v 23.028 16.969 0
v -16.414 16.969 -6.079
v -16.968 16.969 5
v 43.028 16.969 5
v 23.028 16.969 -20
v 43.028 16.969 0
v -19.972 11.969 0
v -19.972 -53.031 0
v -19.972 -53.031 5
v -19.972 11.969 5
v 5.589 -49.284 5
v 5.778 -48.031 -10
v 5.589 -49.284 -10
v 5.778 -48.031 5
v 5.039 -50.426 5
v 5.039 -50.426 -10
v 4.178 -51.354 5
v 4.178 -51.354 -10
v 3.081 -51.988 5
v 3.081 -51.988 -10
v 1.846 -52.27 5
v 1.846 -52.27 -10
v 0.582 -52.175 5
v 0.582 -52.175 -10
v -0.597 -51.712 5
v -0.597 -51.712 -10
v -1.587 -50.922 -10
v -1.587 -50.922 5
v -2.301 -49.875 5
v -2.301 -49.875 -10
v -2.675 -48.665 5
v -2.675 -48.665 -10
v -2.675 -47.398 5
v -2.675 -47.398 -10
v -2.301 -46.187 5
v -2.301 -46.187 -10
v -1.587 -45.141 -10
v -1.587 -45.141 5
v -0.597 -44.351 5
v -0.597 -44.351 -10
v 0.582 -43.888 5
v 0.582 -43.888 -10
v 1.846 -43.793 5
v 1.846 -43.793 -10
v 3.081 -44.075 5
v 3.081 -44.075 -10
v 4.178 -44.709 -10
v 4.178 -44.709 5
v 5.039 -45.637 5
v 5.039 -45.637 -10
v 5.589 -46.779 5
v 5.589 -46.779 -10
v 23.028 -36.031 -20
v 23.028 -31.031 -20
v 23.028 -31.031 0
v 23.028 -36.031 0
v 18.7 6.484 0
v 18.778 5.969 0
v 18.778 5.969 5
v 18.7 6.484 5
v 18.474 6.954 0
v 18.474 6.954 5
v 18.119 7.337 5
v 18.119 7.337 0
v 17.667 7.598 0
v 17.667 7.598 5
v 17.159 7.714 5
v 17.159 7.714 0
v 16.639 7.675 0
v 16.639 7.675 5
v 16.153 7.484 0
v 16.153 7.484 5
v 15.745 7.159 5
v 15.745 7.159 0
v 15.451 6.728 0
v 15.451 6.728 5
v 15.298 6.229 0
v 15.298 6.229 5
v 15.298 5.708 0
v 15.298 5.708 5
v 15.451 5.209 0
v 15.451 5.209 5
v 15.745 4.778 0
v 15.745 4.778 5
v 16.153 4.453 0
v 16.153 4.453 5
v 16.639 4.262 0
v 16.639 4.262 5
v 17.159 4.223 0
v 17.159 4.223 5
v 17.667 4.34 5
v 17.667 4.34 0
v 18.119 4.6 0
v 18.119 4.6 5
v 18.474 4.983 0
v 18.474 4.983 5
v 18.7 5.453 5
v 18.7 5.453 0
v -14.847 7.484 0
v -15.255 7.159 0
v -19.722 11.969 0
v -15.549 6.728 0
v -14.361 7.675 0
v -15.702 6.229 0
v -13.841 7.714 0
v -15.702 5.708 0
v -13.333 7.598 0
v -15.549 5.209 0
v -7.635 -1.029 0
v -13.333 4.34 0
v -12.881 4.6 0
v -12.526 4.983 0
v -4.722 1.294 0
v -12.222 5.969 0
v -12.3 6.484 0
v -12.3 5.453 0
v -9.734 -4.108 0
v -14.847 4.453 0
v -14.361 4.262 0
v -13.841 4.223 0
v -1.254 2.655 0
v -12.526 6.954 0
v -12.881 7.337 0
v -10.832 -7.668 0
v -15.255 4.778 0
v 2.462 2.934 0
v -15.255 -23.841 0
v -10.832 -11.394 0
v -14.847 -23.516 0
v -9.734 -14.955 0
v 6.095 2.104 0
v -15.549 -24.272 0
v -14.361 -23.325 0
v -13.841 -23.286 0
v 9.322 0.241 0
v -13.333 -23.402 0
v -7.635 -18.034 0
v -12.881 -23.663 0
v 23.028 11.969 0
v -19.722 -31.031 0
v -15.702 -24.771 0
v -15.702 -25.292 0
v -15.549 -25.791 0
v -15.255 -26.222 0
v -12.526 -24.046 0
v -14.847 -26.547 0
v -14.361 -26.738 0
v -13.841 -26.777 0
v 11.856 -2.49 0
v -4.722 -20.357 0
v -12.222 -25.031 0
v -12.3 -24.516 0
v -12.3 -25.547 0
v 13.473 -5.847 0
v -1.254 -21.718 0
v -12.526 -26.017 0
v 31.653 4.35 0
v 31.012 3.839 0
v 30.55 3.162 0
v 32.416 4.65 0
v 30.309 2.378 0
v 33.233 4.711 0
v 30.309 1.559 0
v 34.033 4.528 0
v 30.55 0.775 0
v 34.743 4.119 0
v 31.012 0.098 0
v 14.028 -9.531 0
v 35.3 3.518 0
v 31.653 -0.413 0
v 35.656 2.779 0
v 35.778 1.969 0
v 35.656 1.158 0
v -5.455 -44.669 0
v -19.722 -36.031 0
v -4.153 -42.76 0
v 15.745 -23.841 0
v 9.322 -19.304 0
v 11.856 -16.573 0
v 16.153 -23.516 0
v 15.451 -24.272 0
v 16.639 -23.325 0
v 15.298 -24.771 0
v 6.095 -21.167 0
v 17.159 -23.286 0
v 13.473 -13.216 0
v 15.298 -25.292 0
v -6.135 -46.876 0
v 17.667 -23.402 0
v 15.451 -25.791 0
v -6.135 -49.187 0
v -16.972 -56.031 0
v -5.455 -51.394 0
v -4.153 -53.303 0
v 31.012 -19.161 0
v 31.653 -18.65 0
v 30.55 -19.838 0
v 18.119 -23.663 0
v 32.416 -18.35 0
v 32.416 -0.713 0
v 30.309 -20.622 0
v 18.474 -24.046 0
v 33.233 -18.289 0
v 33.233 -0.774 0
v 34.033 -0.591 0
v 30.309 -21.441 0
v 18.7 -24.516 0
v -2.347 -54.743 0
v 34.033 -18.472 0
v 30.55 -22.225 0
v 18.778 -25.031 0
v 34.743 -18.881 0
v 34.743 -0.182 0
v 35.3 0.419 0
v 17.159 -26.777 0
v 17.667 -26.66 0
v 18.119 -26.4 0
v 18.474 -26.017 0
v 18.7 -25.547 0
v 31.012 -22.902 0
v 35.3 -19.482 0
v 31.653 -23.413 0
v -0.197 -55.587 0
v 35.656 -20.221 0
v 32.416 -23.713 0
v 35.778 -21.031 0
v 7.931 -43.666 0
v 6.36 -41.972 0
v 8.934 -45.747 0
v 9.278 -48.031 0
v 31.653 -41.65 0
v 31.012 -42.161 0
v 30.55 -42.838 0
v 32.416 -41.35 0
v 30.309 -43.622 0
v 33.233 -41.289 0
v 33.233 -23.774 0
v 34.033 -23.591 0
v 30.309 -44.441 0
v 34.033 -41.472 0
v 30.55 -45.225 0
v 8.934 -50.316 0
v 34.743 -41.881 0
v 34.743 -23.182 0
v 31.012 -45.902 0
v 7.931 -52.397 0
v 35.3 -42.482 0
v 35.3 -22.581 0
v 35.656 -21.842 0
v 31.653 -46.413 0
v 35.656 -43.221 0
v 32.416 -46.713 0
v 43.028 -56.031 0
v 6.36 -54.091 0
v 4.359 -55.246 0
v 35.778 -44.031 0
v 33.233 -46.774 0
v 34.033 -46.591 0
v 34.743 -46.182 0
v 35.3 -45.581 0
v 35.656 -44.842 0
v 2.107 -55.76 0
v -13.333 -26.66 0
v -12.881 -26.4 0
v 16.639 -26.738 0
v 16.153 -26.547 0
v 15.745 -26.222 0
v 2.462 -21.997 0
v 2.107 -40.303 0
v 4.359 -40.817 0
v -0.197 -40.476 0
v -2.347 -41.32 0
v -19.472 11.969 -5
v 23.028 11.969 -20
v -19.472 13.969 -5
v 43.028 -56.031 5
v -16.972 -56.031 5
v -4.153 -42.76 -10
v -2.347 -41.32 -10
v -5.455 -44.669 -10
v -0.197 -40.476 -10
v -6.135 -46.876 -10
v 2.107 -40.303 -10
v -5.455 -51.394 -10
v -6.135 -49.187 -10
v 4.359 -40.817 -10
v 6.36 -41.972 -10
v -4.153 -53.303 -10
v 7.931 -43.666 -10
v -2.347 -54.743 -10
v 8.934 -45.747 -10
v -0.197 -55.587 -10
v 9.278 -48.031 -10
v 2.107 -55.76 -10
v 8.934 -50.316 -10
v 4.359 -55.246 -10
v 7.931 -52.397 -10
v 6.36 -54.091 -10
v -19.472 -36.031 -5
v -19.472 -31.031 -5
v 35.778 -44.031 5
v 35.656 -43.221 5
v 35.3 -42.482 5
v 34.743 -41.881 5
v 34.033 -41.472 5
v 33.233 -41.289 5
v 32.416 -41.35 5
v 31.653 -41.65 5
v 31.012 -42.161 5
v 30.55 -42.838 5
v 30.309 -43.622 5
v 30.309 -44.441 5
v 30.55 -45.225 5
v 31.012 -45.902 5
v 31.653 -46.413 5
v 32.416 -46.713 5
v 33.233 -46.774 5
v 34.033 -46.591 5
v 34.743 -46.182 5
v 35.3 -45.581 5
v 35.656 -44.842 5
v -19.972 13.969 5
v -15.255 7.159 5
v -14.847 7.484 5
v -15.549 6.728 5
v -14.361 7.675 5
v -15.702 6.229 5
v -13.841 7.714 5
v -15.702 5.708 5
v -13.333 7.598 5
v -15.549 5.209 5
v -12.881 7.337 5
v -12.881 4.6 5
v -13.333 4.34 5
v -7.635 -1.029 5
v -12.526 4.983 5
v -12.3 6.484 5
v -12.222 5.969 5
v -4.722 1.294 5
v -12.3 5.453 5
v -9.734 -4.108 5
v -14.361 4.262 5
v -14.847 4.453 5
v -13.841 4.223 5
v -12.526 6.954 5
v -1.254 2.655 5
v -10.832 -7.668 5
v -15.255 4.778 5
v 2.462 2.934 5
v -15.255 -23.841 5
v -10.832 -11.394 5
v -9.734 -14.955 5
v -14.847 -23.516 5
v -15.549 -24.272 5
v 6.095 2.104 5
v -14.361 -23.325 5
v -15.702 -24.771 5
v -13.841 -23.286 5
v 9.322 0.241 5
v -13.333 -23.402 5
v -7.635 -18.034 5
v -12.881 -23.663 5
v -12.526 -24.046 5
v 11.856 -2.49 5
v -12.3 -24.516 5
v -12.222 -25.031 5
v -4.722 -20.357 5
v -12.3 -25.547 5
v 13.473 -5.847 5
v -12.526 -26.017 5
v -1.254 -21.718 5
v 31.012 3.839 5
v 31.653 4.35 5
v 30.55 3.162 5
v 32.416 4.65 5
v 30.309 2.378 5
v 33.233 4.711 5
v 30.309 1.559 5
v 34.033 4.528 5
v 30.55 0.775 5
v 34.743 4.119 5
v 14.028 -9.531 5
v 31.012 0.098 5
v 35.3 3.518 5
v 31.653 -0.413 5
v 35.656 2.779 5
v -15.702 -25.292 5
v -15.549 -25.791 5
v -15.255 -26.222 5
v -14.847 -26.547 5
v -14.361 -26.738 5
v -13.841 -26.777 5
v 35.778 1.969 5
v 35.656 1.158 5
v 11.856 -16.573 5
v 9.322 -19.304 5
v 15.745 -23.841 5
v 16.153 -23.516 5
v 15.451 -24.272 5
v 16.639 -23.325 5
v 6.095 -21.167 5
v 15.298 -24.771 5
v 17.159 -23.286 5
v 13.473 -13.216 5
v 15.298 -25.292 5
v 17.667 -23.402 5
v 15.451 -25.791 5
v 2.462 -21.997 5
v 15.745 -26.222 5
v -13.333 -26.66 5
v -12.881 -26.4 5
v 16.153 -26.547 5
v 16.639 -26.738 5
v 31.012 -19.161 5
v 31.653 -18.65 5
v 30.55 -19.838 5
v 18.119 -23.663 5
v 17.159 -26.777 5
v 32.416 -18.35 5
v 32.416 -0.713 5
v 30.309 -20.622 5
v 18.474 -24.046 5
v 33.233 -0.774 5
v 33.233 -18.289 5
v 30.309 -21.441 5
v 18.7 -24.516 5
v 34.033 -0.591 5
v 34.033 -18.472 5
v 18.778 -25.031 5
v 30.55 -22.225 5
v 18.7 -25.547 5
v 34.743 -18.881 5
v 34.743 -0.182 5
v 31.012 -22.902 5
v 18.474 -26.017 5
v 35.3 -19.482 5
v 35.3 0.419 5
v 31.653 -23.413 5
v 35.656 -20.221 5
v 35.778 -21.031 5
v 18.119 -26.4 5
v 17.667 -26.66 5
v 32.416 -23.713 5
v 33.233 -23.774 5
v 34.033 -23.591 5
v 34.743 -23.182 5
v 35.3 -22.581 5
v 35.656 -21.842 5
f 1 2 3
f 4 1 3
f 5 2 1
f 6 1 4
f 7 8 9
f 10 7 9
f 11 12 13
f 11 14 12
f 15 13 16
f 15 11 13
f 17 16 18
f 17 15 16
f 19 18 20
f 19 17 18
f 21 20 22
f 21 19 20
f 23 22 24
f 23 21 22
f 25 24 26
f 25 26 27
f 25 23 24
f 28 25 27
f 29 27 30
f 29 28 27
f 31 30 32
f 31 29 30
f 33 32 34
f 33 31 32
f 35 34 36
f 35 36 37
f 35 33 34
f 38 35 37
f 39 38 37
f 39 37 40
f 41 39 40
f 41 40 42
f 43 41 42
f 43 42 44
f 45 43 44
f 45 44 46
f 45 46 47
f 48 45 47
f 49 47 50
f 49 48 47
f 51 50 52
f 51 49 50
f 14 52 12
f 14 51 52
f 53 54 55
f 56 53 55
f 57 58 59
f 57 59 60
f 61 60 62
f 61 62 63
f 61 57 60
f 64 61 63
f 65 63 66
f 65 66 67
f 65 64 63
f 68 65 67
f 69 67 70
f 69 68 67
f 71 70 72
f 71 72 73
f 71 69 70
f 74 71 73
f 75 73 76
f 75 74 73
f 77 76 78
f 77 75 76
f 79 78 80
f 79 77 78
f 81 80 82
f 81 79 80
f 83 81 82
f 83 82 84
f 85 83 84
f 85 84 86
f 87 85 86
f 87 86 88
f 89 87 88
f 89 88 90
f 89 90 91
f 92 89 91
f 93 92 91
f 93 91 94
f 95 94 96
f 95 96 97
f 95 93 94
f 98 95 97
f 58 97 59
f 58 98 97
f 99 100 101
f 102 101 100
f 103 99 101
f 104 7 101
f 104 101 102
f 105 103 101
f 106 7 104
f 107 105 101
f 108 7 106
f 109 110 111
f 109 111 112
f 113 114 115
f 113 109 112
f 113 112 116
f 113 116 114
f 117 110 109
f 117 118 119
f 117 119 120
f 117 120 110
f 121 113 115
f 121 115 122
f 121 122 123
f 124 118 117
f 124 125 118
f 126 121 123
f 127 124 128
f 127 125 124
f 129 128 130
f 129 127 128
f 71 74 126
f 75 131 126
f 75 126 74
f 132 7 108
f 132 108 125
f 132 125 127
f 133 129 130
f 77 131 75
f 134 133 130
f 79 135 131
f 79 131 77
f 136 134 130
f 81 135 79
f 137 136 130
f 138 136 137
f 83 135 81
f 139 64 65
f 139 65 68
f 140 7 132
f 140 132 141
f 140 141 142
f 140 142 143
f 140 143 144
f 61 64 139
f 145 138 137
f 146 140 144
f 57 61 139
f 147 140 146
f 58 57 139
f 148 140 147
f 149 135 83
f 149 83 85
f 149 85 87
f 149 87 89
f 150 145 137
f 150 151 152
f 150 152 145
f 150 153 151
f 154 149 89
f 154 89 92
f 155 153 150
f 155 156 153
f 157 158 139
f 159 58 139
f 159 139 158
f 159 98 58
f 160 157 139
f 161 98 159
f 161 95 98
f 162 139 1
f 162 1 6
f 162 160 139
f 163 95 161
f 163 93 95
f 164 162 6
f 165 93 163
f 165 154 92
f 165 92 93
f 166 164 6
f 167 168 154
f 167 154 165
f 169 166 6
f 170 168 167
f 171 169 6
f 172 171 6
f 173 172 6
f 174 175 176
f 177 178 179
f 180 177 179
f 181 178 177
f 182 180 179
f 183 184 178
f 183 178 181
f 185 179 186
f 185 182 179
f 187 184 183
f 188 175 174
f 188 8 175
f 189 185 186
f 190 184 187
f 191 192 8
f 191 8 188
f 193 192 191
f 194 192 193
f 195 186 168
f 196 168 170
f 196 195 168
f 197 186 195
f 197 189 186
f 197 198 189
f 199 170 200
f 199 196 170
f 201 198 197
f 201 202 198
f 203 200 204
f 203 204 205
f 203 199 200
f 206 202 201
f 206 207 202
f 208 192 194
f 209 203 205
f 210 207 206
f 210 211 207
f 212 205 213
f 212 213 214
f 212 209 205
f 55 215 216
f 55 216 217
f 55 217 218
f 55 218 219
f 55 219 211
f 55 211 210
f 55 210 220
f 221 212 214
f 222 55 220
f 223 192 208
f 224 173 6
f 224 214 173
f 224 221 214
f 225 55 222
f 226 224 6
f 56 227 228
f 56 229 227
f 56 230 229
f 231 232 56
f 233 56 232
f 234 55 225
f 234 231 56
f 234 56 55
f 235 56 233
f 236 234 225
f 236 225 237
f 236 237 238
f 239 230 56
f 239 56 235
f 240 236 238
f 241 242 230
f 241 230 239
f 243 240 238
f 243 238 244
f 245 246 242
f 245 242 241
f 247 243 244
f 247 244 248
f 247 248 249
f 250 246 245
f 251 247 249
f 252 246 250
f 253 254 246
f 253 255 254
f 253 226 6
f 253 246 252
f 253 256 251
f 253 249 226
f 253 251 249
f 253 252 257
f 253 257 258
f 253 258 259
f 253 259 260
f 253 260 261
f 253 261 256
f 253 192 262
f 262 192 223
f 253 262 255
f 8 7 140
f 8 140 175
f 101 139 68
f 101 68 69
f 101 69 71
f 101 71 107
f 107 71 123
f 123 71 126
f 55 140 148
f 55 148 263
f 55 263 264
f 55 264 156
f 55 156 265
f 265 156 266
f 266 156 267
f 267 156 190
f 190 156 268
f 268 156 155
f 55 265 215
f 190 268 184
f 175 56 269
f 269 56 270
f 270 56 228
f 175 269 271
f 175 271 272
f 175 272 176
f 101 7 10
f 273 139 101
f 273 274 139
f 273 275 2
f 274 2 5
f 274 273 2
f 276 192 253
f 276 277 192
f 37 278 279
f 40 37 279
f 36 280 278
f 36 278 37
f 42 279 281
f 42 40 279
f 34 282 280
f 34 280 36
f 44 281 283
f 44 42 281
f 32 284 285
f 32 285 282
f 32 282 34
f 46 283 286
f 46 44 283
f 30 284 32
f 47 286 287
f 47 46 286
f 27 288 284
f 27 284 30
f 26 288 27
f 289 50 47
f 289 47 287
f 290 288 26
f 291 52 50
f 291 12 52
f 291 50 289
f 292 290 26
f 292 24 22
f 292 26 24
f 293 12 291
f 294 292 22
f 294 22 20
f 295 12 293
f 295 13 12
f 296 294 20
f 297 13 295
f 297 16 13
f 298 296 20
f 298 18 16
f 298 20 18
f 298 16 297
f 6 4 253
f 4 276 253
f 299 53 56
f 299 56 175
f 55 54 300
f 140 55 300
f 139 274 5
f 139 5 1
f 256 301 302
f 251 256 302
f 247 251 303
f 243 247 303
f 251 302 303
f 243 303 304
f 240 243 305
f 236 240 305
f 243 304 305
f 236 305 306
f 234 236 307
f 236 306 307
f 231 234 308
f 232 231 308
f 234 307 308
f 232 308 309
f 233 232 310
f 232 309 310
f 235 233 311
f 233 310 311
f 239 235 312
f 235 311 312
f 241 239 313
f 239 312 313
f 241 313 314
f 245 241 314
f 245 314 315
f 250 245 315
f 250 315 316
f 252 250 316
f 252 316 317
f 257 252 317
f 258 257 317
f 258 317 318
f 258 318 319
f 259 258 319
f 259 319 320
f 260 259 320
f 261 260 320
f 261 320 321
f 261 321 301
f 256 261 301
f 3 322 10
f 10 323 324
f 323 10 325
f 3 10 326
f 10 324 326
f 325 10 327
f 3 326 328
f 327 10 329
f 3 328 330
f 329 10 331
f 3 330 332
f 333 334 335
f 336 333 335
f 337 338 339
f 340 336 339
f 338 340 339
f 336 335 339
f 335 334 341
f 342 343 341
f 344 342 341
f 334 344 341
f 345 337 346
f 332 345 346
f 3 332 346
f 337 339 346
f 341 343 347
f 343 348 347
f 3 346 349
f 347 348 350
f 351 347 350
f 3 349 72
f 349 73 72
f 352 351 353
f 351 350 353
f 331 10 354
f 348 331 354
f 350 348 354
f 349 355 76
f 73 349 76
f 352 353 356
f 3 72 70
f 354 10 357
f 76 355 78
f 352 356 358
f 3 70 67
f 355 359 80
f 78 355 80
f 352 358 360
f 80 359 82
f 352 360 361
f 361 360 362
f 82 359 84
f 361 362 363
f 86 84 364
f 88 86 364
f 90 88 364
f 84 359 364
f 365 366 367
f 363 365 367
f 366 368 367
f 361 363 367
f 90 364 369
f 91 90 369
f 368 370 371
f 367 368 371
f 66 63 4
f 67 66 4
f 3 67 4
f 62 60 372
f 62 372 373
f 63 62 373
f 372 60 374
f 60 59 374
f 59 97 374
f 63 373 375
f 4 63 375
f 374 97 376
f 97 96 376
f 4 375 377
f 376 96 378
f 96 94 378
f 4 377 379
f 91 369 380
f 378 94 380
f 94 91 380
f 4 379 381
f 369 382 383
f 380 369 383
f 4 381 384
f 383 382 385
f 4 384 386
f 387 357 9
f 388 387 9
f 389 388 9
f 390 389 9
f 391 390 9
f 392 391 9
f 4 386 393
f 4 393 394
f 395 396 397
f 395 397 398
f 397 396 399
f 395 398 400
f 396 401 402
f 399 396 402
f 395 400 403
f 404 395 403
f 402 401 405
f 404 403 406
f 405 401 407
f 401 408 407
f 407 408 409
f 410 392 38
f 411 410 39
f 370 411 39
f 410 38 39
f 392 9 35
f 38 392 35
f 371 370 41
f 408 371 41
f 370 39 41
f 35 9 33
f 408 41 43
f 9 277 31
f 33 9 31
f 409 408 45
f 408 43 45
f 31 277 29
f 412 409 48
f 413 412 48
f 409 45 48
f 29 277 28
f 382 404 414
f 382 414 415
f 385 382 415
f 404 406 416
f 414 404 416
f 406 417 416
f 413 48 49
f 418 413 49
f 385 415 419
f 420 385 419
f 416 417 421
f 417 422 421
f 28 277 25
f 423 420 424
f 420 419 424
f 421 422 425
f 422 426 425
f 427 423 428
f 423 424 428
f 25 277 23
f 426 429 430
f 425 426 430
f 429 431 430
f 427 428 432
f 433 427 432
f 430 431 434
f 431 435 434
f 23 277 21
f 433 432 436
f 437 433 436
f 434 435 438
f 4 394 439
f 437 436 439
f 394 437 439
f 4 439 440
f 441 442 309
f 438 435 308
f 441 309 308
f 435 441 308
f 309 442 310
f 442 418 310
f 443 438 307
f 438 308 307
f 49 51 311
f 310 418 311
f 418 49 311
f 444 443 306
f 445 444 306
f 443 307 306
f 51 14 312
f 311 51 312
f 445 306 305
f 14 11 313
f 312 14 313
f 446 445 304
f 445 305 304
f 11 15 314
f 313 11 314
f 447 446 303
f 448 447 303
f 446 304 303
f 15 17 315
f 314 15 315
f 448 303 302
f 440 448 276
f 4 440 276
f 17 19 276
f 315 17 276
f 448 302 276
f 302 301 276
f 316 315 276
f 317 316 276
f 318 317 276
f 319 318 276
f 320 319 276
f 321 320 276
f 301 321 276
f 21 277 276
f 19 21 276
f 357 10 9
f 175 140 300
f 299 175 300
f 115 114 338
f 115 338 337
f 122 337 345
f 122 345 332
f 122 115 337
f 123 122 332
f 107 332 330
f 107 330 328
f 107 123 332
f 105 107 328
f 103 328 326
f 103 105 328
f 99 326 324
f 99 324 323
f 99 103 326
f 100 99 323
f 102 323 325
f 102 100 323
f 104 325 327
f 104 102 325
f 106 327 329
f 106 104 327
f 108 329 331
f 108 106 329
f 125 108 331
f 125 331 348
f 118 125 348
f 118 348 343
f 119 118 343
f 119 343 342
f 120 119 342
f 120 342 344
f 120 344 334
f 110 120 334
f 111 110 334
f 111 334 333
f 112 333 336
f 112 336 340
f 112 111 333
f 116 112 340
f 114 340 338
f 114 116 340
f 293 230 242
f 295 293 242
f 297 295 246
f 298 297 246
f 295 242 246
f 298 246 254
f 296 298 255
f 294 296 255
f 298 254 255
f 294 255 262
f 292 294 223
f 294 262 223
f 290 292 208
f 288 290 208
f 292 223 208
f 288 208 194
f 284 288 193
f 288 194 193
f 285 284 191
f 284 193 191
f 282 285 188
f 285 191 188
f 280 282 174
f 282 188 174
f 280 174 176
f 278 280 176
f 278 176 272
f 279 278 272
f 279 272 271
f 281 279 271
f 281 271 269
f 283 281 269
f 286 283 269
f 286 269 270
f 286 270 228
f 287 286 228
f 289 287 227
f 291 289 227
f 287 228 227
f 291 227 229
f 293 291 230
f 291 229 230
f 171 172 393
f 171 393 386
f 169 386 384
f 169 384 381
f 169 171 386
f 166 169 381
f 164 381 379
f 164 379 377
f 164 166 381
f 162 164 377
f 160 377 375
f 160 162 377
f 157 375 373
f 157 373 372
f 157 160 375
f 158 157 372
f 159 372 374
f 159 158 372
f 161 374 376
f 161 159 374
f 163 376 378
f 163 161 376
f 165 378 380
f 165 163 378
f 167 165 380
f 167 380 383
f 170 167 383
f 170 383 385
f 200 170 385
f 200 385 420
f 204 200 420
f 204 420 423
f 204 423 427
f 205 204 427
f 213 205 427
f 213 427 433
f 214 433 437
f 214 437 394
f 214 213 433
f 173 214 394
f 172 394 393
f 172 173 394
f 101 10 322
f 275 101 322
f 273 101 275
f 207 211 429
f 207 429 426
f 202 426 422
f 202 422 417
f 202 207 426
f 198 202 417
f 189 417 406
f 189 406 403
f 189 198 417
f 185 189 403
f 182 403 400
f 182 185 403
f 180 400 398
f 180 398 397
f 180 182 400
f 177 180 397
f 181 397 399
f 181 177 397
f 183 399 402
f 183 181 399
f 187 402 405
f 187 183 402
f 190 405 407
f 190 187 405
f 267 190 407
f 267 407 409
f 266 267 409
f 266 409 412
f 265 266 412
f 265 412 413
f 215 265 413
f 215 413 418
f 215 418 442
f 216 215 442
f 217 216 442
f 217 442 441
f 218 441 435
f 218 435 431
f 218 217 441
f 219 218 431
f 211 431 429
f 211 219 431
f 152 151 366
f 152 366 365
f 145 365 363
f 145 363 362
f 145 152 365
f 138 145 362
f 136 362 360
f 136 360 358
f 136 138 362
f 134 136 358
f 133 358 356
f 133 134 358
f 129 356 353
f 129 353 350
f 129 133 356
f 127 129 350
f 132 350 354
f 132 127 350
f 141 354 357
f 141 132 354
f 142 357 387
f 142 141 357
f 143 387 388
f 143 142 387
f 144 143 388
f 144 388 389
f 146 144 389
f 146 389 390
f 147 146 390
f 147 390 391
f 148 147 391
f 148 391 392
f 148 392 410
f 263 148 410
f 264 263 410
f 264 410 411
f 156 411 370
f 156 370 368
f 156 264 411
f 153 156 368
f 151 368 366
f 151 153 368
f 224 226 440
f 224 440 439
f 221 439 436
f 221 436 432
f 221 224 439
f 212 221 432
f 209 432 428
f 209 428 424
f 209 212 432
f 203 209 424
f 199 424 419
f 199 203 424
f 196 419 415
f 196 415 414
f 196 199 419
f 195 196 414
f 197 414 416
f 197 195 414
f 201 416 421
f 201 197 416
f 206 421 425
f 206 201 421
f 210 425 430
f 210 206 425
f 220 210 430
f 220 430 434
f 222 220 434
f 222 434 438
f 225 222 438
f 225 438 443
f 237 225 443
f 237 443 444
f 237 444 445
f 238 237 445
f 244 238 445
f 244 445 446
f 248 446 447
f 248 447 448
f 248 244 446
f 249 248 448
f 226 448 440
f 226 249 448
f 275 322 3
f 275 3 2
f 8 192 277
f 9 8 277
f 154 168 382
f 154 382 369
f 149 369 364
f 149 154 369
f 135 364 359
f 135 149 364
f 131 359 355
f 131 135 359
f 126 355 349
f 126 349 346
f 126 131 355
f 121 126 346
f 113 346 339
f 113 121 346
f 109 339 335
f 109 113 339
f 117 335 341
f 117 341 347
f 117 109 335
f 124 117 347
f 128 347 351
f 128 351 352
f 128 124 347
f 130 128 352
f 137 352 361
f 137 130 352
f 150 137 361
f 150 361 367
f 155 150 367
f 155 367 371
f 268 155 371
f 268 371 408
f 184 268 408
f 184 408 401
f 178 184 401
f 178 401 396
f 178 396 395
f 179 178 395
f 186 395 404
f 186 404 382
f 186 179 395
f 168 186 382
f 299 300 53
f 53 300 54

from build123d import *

# Parameters (mm, degrees)
SKETCH_2_W          = 63
SKETCH_2_H          = 43
SKETCH_2_R          = 1.75
SKETCH_2_R_2        = 12.5
SKETCH_2_R_3        = 2.75
EXTRUDE_1_DEPTH     = 5
SKETCH_3_W          = 63
SKETCH_3_H          = 5
EXTRUDE_2_DEPTH     = 25
SKETCH_4_R          = 4.25
CUT_EXTRUDE_2_DEPTH = 25
SKETCH_5_R          = 7.75
SKETCH_5_R_2        = 4.25
EXTRUDE_3_DEPTH     = 10
EXTRUDE_4_DEPTH     = 5
EXTRUDE_5_DEPTH     = 5
SKETCH_10_R         = 2.75
CUT_EXTRUDE_3_DEPTH = 75.939521233
SKETCH_11_W         = 20
SKETCH_11_H         = 5
EXTRUDE_6_DEPTH     = 5
CHAMFER_1_SIZE      = 3


with BuildPart() as part:
    # 草图2 → 凸台-拉伸1 (new body)
    with BuildSketch(Plane.XY):
        with Locations((11.527972028, -9.531468531)):
            Rectangle(SKETCH_2_W, SKETCH_2_H)
        with Locations((-13.972027972, 5.968531469)):
            Circle(SKETCH_2_R, mode=Mode.SUBTRACT)
        with Locations((17.027972028, 5.968531469)):
            Circle(SKETCH_2_R, mode=Mode.SUBTRACT)
        with Locations((17.027972028, -25.031468531)):
            Circle(SKETCH_2_R, mode=Mode.SUBTRACT)
        with Locations((-13.972027972, -25.031468531)):
            Circle(SKETCH_2_R, mode=Mode.SUBTRACT)
        with Locations((1.527972028, -9.531468531)):
            Circle(SKETCH_2_R_2, mode=Mode.SUBTRACT)
        with Locations((33.027972028, 1.968531469)):
            Circle(SKETCH_2_R_3, mode=Mode.SUBTRACT)
        with Locations((33.027972028, -21.031468531)):
            Circle(SKETCH_2_R_3, mode=Mode.SUBTRACT)
    extrude(amount=EXTRUDE_1_DEPTH)

    # 草图3 → 凸台-拉伸2 (add)
    with BuildSketch(Plane.XZ.offset(31.031468531)):
        with Locations((11.527972028, 2.5)):
            Rectangle(SKETCH_3_W, SKETCH_3_H)
    extrude(amount=EXTRUDE_2_DEPTH)

    # 草图4 → 切除-拉伸2 (cut)
    with BuildSketch(Plane.XY.offset(5)):
        with Locations((1.527972028, -48.031468531)):
            Circle(SKETCH_4_R)
    extrude(amount=-CUT_EXTRUDE_2_DEPTH, mode=Mode.SUBTRACT)

    # 草图5 → 凸台-拉伸3 (add)
    with BuildSketch(Plane(origin=(0, 0, 0), x_dir=(-1, 0, 0), z_dir=(0, 0, -1))):
        with Locations(Location((-1.527972028, -48.031468531, 0), (0, 0, 180))):
            Circle(SKETCH_5_R)
        with Locations(Location((-1.527972028, -48.031468531, 0), (0, 0, 180))):
            Circle(SKETCH_5_R_2, mode=Mode.SUBTRACT)
    extrude(amount=EXTRUDE_3_DEPTH)

    # 草图7 → 凸台-拉伸4 (add)
    with BuildSketch(Plane(origin=(0, 11.968531469, 0), x_dir=(1, 0, 0), z_dir=(0, 1, 0))):
        Polygon((-19.972027972, -5), (-19.472027972, 5), (23.027972028, 20), (23.027972028, -5), align=None)
    extrude(amount=EXTRUDE_4_DEPTH)

    # 草图8 → 凸台-拉伸5 (add)
    with BuildSketch(Plane(origin=(0, -31.031468531, 0), x_dir=(-1, 0, 0), z_dir=(0, -1, 0))):
        Polygon((-23.027972028, 20), (-23.027972028, 0), (19.722027972, 0), (19.472027972, 5), align=None)
    extrude(amount=EXTRUDE_5_DEPTH)

    # 草图10 → 切除-拉伸3 (cut, through all)
    with BuildSketch(Plane.XY.offset(5)):
        with Locations((33.027972028, -44.031468531)):
            Circle(SKETCH_10_R)
    extrude(amount=-CUT_EXTRUDE_3_DEPTH, mode=Mode.SUBTRACT)

    # 草图11 → 凸台-拉伸6 (add)
    with BuildSketch(Plane(origin=(0, 11.968531469, 0), x_dir=(1, 0, 0), z_dir=(0, 1, 0))):
        with Locations((33.027972028, -2.5)):
            Rectangle(SKETCH_11_W, SKETCH_11_H)
    extrude(amount=EXTRUDE_6_DEPTH)

    # 倒角1
    chamfer_1_edges = [part.edges().sort_by_distance(p)[0] for p in [
        (-19.972027972, -56.031468531, 2.5),
        (-19.722027972, 16.968531469, 0),
    ]]
    chamfer(chamfer_1_edges, length=CHAMFER_1_SIZE)


solid = part.part
